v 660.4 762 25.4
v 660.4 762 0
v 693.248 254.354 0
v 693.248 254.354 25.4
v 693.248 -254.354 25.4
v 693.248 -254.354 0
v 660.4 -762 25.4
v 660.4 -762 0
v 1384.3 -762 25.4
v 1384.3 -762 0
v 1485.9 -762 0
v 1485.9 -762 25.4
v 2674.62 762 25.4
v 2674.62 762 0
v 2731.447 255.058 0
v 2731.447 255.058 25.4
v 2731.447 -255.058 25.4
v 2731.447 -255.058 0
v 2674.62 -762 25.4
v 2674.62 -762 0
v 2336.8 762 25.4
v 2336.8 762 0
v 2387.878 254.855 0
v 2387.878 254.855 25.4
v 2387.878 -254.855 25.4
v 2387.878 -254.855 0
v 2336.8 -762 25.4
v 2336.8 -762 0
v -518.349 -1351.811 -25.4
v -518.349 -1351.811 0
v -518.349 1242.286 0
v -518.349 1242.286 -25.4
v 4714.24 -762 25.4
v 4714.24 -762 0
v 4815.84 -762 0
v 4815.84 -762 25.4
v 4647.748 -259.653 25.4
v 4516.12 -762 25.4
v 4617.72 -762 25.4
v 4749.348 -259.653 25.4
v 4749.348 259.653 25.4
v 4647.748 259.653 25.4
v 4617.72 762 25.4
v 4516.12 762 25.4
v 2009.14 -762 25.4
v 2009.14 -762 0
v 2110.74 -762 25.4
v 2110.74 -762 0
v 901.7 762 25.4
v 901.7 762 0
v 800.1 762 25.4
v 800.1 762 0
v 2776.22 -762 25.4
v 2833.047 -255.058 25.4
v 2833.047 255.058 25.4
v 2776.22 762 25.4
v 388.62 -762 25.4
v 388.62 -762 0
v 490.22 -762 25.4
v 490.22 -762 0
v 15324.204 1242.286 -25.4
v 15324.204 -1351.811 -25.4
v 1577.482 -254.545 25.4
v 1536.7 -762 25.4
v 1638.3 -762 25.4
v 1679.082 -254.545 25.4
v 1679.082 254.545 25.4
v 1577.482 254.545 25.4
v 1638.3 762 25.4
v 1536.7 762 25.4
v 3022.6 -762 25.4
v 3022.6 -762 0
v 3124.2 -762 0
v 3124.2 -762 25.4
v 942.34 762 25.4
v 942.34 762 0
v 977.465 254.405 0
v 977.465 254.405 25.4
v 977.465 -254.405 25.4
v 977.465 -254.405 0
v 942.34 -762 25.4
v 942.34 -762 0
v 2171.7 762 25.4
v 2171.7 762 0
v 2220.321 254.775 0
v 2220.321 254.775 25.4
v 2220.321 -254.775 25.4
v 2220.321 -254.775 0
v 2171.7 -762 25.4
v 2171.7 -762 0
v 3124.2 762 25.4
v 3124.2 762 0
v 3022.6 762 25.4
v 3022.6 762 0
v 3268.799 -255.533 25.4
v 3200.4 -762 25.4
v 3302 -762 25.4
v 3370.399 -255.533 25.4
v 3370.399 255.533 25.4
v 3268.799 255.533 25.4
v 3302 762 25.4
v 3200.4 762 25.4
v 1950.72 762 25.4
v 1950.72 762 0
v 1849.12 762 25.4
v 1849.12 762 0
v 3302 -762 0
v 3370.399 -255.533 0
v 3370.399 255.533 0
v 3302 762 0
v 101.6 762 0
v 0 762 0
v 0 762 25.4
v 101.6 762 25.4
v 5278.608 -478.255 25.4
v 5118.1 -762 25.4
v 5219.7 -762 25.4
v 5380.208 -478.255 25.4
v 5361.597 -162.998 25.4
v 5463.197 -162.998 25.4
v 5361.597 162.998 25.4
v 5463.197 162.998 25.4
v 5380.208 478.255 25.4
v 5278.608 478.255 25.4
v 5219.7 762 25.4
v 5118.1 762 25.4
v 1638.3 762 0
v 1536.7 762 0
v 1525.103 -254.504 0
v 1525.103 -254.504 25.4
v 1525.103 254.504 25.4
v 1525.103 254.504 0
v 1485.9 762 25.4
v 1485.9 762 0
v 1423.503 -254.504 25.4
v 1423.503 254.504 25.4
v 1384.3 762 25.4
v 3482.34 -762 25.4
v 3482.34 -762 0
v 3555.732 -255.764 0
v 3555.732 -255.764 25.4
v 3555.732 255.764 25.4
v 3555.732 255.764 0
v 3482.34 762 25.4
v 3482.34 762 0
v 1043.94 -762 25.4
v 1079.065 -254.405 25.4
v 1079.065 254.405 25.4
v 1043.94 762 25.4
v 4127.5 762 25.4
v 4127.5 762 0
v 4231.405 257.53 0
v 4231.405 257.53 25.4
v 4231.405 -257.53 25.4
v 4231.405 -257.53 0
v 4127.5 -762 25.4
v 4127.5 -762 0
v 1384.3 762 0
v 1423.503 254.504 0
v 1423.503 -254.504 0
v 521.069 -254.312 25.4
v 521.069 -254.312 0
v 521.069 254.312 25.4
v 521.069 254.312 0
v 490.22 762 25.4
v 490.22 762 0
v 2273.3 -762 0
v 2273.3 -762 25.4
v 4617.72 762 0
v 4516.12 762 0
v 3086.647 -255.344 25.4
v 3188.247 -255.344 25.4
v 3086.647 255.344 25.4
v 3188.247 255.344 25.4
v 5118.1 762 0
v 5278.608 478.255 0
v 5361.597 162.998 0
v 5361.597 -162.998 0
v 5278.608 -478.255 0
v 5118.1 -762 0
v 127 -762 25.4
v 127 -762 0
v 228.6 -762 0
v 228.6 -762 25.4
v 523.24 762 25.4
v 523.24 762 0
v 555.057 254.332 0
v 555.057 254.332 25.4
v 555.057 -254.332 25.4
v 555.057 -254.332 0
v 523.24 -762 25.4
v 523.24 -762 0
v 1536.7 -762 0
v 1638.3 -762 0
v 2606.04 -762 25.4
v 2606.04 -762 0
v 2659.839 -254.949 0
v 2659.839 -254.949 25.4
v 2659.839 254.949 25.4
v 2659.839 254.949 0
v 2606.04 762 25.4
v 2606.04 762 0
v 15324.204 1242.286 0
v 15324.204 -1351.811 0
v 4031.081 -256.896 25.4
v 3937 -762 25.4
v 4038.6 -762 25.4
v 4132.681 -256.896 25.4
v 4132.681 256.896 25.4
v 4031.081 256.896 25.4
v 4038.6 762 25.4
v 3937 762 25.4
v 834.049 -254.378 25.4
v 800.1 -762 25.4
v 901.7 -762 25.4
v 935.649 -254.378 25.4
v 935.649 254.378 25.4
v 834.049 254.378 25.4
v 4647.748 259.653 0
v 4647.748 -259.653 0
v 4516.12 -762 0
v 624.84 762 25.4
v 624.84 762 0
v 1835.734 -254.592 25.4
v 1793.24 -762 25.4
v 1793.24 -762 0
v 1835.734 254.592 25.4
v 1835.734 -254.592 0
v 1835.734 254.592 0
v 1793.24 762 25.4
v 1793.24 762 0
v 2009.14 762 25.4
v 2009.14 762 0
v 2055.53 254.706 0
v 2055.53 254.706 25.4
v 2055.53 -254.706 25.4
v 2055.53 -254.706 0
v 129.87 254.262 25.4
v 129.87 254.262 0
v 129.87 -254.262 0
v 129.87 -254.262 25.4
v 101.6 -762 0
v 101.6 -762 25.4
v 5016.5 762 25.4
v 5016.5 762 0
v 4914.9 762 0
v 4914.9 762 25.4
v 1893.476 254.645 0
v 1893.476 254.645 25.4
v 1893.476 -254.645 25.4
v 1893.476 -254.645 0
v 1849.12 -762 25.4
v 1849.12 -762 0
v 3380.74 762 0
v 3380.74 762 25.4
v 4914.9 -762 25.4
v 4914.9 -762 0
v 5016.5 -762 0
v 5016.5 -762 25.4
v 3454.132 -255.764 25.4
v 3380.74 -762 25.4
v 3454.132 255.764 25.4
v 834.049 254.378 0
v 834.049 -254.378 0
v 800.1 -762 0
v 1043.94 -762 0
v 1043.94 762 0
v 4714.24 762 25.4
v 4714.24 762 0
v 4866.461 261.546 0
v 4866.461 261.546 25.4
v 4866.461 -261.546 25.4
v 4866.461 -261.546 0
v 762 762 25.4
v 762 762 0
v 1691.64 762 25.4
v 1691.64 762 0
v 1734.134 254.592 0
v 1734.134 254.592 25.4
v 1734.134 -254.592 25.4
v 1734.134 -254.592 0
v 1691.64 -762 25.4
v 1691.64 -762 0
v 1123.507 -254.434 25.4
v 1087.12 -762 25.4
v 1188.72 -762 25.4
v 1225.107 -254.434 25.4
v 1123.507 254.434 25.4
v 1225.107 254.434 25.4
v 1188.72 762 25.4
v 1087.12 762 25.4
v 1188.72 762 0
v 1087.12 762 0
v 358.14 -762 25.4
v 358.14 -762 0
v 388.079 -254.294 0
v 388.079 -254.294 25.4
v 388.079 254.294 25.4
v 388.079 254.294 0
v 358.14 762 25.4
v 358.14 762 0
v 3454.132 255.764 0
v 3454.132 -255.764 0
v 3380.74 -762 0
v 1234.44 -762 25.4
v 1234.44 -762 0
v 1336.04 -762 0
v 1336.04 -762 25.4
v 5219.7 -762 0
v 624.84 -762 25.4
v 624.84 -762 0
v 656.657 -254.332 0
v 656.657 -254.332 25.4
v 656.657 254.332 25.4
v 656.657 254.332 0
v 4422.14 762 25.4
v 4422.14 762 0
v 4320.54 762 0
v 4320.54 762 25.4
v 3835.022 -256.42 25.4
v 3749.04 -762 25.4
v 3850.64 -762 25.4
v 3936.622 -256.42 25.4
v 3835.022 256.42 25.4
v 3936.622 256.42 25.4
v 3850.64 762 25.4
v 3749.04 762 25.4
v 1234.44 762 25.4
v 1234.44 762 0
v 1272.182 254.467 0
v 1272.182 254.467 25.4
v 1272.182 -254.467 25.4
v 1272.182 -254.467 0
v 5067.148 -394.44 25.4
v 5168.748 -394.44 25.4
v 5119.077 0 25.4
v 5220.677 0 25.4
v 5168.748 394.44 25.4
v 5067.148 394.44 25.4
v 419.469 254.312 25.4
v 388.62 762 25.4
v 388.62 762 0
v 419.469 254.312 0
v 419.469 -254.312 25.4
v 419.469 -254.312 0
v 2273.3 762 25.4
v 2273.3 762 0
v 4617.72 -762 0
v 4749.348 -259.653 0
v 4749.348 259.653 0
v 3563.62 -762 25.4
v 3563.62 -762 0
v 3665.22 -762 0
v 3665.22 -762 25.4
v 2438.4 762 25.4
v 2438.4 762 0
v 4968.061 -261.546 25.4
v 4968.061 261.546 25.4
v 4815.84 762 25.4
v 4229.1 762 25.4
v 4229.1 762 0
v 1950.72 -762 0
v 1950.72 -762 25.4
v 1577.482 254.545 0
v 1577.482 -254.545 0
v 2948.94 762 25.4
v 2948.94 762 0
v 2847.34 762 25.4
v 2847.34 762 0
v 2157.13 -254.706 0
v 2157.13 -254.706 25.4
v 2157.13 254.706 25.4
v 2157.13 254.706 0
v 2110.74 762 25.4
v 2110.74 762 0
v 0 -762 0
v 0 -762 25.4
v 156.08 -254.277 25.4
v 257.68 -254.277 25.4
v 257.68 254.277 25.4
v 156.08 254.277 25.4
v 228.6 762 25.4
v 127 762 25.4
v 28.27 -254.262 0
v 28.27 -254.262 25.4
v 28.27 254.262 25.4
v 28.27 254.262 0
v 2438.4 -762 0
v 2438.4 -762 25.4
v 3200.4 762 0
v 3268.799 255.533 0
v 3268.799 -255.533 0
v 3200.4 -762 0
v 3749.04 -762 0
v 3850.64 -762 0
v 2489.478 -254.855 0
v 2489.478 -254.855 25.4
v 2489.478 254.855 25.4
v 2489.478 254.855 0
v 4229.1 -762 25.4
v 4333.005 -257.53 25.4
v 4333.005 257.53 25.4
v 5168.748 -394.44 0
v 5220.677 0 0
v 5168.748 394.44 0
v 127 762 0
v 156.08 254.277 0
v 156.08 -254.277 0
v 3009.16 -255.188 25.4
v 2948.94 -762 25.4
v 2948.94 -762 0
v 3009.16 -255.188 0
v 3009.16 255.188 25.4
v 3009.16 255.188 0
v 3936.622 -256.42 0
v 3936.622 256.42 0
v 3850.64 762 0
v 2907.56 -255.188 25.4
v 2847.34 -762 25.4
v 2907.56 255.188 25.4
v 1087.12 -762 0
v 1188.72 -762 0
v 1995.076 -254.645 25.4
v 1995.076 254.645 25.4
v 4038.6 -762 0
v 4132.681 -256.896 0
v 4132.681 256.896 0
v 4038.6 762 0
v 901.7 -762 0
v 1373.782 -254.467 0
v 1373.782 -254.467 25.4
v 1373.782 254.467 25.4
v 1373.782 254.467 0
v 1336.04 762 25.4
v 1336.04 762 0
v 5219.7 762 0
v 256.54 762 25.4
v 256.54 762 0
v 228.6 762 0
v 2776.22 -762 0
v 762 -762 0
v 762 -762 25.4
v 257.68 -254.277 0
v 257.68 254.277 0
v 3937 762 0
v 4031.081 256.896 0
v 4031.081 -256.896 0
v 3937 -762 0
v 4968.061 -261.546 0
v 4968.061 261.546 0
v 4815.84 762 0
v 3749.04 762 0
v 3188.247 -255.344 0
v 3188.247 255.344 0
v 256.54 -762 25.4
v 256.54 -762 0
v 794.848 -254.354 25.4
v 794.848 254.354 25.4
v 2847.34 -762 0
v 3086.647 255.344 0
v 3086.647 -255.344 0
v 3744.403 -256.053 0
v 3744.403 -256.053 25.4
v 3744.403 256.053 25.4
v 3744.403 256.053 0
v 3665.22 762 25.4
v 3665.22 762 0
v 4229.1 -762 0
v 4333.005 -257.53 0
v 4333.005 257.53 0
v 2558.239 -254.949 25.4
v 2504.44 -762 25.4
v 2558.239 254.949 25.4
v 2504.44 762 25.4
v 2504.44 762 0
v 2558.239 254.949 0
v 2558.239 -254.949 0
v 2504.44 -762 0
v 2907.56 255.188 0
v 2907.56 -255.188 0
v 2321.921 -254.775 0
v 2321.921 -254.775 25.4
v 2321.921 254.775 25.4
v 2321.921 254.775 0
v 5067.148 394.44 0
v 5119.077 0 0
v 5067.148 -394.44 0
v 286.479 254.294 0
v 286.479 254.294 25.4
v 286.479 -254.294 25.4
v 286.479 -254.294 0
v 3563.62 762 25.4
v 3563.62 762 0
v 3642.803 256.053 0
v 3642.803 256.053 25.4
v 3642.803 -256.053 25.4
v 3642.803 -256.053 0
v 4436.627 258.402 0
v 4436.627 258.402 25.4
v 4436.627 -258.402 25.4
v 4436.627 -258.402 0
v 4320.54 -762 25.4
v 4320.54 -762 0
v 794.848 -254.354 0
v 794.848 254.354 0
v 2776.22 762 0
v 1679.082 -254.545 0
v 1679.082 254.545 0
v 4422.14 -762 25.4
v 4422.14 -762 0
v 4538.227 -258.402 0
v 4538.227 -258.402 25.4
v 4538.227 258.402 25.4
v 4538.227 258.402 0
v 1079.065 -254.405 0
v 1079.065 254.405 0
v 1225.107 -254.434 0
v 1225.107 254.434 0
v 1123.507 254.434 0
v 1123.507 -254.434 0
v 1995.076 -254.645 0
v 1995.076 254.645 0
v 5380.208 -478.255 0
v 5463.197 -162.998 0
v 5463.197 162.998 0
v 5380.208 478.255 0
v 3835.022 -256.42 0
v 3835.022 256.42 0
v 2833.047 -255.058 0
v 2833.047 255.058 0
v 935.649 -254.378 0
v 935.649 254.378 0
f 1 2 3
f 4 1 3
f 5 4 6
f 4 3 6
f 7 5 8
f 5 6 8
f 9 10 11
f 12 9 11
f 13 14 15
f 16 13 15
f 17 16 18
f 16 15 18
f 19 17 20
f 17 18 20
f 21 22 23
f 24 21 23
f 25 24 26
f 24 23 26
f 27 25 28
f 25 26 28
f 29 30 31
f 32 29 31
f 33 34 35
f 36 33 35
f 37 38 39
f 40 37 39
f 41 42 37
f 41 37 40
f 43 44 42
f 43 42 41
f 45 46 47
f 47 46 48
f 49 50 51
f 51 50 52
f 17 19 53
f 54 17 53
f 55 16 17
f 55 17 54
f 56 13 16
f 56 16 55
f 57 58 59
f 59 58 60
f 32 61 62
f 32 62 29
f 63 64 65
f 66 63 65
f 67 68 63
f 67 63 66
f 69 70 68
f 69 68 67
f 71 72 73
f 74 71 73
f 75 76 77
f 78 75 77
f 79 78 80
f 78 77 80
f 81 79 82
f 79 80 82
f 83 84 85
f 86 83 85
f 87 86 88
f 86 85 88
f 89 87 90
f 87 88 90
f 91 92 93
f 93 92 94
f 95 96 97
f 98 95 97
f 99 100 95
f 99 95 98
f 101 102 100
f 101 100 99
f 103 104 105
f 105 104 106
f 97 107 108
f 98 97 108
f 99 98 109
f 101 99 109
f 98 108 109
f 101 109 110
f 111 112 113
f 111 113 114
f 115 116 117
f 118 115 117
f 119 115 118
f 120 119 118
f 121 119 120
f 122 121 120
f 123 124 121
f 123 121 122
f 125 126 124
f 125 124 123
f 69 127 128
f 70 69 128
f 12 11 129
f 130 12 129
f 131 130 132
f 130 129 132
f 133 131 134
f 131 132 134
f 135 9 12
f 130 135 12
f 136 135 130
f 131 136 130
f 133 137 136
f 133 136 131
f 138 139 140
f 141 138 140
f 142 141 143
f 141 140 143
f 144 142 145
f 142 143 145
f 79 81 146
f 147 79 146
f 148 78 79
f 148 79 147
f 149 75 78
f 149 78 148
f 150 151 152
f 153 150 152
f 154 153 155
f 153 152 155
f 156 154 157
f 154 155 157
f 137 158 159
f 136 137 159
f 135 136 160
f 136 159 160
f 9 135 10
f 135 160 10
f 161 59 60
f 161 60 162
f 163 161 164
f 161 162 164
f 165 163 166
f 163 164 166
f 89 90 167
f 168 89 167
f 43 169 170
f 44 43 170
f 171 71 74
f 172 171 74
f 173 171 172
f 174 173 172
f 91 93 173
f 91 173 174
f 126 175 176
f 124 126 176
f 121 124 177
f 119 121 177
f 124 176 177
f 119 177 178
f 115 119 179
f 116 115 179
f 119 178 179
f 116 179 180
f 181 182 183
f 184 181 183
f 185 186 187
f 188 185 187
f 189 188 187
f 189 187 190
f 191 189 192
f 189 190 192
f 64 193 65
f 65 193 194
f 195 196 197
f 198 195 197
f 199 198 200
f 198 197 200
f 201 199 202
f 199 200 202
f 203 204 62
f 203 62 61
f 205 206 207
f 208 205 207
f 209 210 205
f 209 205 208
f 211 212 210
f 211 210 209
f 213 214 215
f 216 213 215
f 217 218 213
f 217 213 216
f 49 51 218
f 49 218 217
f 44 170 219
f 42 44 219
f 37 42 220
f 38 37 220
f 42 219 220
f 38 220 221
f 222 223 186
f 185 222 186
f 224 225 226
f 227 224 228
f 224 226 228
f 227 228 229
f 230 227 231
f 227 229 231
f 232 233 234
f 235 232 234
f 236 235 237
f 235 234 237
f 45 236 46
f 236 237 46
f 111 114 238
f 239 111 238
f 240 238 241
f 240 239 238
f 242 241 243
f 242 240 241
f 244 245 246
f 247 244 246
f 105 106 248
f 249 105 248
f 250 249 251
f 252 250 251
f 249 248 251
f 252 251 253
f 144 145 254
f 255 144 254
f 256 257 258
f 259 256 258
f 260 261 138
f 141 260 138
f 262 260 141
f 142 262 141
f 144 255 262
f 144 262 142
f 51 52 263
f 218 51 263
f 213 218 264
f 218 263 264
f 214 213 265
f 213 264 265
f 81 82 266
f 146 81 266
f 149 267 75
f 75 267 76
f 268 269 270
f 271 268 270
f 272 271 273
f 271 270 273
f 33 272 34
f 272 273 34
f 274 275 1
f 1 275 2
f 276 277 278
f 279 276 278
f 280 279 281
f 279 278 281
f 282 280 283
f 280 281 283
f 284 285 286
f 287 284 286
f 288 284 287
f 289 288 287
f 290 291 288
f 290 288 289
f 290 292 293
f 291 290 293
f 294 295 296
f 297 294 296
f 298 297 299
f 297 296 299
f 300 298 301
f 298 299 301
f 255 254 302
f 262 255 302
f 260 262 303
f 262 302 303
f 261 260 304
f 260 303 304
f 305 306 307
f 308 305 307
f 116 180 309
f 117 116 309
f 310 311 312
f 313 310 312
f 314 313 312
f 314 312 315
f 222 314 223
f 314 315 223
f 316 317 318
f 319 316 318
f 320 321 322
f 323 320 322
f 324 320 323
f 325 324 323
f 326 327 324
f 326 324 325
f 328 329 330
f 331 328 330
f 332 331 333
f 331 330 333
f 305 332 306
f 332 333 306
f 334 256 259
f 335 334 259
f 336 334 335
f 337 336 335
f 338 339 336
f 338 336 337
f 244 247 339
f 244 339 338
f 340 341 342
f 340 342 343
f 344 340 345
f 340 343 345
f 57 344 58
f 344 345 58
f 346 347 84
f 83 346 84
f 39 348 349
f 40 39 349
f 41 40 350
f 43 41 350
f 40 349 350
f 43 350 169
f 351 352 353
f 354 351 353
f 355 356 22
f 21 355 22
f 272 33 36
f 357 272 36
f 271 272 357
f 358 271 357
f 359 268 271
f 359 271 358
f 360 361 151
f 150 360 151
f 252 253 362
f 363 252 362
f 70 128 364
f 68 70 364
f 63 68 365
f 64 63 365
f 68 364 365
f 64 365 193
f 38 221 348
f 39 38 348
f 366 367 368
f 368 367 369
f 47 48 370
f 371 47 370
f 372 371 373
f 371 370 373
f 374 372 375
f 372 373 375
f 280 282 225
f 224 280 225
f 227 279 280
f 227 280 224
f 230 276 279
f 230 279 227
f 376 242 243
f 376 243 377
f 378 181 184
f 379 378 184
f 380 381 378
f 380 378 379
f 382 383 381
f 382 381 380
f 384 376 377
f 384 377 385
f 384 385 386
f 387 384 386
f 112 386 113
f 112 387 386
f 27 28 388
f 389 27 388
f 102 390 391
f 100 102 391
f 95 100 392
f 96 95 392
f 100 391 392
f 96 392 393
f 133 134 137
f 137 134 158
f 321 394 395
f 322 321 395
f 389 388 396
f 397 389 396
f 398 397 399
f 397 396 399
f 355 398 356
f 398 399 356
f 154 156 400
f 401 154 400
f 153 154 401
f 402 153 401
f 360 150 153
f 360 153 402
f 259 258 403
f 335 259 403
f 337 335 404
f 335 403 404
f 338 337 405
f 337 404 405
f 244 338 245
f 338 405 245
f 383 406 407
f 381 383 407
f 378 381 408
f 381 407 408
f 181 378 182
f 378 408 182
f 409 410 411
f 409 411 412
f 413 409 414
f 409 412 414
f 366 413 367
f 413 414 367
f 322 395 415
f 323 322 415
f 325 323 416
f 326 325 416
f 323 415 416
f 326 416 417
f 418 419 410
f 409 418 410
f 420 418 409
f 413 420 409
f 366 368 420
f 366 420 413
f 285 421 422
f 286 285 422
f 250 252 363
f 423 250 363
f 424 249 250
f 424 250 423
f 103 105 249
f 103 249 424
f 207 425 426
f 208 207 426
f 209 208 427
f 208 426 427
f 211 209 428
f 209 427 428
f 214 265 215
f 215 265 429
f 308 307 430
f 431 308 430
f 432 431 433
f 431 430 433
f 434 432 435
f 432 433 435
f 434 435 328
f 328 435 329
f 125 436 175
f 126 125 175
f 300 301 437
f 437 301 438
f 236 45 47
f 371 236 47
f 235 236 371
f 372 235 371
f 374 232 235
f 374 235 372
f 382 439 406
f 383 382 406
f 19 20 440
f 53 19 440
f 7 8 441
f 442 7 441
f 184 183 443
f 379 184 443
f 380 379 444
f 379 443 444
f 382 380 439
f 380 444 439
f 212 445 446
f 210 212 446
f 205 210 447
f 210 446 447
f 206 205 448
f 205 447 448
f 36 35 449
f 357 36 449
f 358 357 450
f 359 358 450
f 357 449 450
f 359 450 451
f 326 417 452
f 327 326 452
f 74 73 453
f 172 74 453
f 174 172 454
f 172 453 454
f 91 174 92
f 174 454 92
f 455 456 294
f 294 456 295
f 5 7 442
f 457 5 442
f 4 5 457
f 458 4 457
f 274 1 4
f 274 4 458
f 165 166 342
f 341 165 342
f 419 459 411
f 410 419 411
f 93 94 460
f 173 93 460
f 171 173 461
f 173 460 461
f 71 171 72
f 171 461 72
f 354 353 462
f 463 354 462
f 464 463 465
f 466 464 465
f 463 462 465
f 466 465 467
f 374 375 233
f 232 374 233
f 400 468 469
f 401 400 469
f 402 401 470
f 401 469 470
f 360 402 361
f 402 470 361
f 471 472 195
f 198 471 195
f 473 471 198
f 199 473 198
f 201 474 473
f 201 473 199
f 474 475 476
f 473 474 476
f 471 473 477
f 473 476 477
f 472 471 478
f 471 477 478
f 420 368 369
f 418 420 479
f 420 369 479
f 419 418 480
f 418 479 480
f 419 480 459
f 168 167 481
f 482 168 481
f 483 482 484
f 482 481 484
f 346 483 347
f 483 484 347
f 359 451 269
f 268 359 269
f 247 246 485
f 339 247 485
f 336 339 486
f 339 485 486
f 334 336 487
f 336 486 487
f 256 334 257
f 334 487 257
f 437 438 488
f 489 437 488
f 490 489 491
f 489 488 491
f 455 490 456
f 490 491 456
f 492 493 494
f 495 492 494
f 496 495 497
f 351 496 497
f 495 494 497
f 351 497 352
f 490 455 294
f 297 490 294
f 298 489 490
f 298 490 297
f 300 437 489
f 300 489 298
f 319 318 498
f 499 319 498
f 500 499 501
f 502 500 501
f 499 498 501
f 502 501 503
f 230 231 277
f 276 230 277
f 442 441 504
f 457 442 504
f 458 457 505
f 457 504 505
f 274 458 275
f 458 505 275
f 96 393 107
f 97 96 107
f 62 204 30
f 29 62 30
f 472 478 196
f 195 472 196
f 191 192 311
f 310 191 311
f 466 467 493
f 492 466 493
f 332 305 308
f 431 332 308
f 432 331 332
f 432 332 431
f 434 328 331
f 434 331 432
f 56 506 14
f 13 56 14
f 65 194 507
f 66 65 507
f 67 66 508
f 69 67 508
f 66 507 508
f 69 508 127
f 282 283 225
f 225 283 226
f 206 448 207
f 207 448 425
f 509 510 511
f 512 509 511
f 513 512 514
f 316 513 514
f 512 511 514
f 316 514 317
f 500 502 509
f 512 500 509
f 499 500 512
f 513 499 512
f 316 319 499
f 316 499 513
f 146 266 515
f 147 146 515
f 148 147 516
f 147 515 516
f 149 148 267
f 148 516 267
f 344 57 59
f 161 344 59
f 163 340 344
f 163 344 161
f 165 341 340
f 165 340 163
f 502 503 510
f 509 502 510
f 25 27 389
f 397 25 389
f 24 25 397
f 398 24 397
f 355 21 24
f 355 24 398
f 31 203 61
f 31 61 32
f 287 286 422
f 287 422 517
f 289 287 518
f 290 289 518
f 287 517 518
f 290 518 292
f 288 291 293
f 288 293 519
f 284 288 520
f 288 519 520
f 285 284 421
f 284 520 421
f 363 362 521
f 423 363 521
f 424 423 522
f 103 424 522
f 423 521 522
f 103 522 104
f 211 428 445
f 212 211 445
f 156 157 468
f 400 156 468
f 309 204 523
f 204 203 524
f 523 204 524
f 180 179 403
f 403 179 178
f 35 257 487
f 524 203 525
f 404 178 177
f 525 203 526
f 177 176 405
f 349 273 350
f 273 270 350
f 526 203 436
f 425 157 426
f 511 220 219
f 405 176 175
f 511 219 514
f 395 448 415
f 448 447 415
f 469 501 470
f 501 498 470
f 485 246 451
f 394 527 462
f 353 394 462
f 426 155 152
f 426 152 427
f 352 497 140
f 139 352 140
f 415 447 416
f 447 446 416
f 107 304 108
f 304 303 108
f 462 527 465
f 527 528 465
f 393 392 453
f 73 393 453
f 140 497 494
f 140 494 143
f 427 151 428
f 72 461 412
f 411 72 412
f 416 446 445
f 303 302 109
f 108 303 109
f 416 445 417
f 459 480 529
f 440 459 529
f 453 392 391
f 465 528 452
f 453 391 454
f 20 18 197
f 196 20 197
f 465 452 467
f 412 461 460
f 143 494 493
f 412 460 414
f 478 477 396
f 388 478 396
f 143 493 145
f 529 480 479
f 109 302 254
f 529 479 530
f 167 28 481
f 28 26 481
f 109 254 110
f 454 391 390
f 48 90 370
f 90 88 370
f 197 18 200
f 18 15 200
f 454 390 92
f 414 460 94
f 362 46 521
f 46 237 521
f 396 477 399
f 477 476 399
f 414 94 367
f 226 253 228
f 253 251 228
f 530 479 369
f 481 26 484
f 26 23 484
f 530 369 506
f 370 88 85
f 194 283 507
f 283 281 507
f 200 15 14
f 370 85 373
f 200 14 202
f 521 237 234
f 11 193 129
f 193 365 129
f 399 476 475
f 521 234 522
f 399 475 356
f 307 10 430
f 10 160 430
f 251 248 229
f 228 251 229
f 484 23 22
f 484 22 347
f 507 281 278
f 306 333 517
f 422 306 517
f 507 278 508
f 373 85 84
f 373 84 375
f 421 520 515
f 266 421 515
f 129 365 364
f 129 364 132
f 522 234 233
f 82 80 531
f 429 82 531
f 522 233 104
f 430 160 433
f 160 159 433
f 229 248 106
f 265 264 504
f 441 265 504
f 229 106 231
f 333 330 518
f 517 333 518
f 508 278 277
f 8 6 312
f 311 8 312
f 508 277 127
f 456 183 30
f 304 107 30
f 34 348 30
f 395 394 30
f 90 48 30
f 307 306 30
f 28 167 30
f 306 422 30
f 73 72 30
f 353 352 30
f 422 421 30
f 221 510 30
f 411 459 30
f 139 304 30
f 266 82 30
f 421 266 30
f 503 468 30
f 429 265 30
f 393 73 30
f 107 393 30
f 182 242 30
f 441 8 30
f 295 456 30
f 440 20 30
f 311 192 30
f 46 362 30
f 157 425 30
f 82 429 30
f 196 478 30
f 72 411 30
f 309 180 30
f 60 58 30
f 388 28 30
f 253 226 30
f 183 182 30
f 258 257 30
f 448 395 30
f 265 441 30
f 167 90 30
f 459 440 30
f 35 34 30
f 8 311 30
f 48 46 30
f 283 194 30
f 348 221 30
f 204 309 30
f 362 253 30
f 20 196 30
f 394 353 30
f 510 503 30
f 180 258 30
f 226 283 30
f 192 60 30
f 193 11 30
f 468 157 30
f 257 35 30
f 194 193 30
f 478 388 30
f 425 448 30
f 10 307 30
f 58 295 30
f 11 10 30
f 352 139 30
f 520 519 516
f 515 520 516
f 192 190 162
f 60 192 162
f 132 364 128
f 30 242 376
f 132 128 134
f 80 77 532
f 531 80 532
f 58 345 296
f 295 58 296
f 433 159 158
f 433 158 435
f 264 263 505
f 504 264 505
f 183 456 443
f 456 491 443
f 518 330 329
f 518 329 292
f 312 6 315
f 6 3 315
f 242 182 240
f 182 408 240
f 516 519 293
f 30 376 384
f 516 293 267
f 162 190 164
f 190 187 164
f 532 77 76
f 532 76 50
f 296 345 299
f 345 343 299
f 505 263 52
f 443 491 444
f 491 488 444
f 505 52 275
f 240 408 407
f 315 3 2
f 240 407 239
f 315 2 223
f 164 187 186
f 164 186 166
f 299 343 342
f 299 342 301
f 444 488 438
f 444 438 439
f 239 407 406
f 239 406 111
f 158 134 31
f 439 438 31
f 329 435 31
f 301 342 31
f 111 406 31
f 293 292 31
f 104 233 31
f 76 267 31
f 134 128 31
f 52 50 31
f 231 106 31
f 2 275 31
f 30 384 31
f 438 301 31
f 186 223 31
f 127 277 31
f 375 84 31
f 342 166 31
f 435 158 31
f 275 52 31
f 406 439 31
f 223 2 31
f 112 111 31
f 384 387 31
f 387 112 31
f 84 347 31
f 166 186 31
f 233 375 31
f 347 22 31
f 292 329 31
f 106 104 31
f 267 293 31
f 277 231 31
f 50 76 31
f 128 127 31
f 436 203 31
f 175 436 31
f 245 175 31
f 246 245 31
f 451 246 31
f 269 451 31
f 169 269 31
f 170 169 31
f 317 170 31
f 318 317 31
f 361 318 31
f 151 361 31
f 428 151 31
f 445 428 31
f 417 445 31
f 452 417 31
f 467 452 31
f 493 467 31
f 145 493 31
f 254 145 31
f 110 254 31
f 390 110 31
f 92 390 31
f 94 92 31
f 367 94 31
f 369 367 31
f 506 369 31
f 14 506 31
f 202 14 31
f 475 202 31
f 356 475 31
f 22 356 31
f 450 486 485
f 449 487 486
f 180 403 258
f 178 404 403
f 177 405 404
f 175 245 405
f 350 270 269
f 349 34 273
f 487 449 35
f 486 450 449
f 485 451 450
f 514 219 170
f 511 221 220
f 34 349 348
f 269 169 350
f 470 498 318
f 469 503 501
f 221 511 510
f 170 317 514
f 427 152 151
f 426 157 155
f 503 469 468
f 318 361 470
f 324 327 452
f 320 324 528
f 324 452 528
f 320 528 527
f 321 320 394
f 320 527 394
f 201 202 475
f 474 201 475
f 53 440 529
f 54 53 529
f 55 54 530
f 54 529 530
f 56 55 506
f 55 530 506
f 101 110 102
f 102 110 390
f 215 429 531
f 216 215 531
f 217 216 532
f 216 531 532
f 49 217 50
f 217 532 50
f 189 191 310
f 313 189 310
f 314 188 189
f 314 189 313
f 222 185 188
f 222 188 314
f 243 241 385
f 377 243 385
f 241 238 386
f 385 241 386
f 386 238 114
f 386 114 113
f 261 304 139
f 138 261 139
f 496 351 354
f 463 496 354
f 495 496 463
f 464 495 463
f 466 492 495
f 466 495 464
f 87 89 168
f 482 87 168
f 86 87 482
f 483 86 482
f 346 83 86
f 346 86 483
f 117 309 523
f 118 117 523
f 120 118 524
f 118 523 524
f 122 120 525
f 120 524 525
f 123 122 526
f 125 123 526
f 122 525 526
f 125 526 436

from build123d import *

# Parameters (mm, degrees)
BOSS_EXTRUDE1_DEPTH = 25.4
SKETCH2_W           = 15842.55357726
SKETCH2_H           = 2594.096375424
BOSS_EXTRUDE2_DEPTH = 25.4
LPATTERN1_DEPTH     = 25.4


# Read off the part's stored shape, not the designer's step: LPattern1
with BuildPart() as part:
    # Sketch1 → Boss-Extrude1 (new body)
    with BuildSketch(Plane.XY):
        with BuildLine():
            Line((0, 762), (101.6, 762))
            ThreePointArc((101.6, 762), (133.405313757, 0), (101.6, -762))
            Line((101.6, -762), (0, -762))
            ThreePointArc((0, -762), (31.805313757, 0), (0, 762))
        make_face()
    extrude(amount=BOSS_EXTRUDE1_DEPTH)

    # Sketch2 → Boss-Extrude2 (add)
    with BuildSketch(Plane(origin=(0, 0, 0), x_dir=(-1, 0, 0), z_dir=(0, 0, -1))):
        with Locations((-7402.927555246, -54.762680467)):
            Rectangle(SKETCH2_W, SKETCH2_H)
    extrude(amount=BOSS_EXTRUDE2_DEPTH)

    # LPattern1 outline → LPattern1 (add)
    with BuildSketch(Plane.XY):
        with BuildLine():
            Line((127, -762), (228.6, -762))
            ThreePointArc((228.6, -762), (261.317346725, 0), (228.6, 762))
            Line((228.6, 762), (127, 762))
            ThreePointArc((127, 762), (159.717346725, 0), (127, -762))
        make_face()
        with BuildLine():
            Line((256.54, -762), (358.14, -762))
            ThreePointArc((358.14, -762), (391.823335287, 0), (358.14, 762))
            Line((358.14, 762), (256.54, 762))
            ThreePointArc((256.54, 762), (290.223335287, 0), (256.54, -762))
        make_face()
        with BuildLine():
            Line((388.62, -762), (490.22, -762))
            ThreePointArc((490.22, -762), (524.928223621, 0), (490.22, 762))
            Line((490.22, 762), (388.62, 762))
            ThreePointArc((388.62, 762), (423.328223621, 0), (388.62, -762))
        make_face()
        with BuildLine():
            Line((523.24, -762), (624.84, -762))
            ThreePointArc((624.84, -762), (660.637580386, 0), (624.84, 762))
            Line((624.84, 762), (523.24, 762))
            ThreePointArc((523.24, 762), (559.037580386, 0), (523.24, -762))
        make_face()
        with BuildLine():
            Line((660.4, -762), (762, -762))
            ThreePointArc((762, -762), (798.957700765, 0), (762, 762))
            Line((762, 762), (660.4, 762))
            ThreePointArc((660.4, 762), (697.357700765, 0), (660.4, -762))
        make_face()
        with BuildLine():
            Line((800.1, -762), (901.7, -762))
            ThreePointArc((901.7, -762), (939.895729248, 0), (901.7, 762))
            Line((901.7, 762), (800.1, 762))
            ThreePointArc((800.1, 762), (838.295729248, 0), (800.1, -762))
        make_face()
        with BuildLine():
            Line((942.34, -762), (1043.94, -762))
            ThreePointArc((1043.94, -762), (1083.459808257, 0), (1043.94, 762))
            Line((1043.94, 762), (942.34, 762))
            ThreePointArc((942.34, 762), (981.859808257, 0), (942.34, -762))
        make_face()
        with BuildLine():
            Line((1087.12, -762), (1188.72, -762))
            ThreePointArc((1188.72, -762), (1229.659259206, 0), (1188.72, 762))
            Line((1188.72, 762), (1087.12, 762))
            ThreePointArc((1087.12, 762), (1128.059259206, 0), (1087.12, -762))
        make_face()
        with BuildLine():
            Line((1234.44, -762), (1336.04, -762))
            ThreePointArc((1336.04, -762), (1378.504804581, 0), (1336.04, 762))
            Line((1336.04, 762), (1234.44, 762))
            ThreePointArc((1234.44, 762), (1276.904804581, 0), (1234.44, -762))
        make_face()
        with BuildLine():
            Line((1384.3, -762), (1485.9, -762))
            ThreePointArc((1485.9, -762), (1530.008842366, 0), (1485.9, 762))
            Line((1485.9, 762), (1384.3, 762))
            ThreePointArc((1384.3, 762), (1428.408842366, 0), (1384.3, -762))
        make_face()
        with BuildLine():
            Line((1536.7, -762), (1638.3, -762))
            ThreePointArc((1638.3, -762), (1684.185787837, 0), (1638.3, 762))
            Line((1638.3, 762), (1536.7, 762))
            ThreePointArc((1536.7, 762), (1582.585787837, 0), (1536.7, -762))
        make_face()
        with BuildLine():
            Line((1691.64, -762), (1793.24, -762))
            ThreePointArc((1793.24, -762), (1841.052502906, 0), (1793.24, 762))
            Line((1793.24, 762), (1691.64, 762))
            ThreePointArc((1691.64, 762), (1739.452502906, 0), (1691.64, -762))
        make_face()
        with BuildLine():
            Line((1849.12, -762), (1950.72, -762))
            ThreePointArc((1950.72, -762), (2000.628840496, 0), (1950.72, 762))
            Line((1950.72, 762), (1849.12, 762))
            ThreePointArc((1849.12, 762), (1899.028840496, 0), (1849.12, -762))
        make_face()
        with BuildLine():
            Line((2009.14, -762), (2110.74, -762))
            ThreePointArc((2110.74, -762), (2162.938341703, 0), (2110.74, 762))
            Line((2110.74, 762), (2009.14, 762))
            ThreePointArc((2009.14, 762), (2061.338341703, 0), (2009.14, -762))
        make_face()
        with BuildLine():
            Line((2171.7, -762), (2273.3, -762))
            ThreePointArc((2273.3, -762), (2328.00913853, 0), (2273.3, 762))
            Line((2273.3, 762), (2171.7, 762))
            ThreePointArc((2171.7, 762), (2226.40913853, 0), (2171.7, -762))
        make_face()
        with BuildLine():
            Line((2336.8, -762), (2438.4, -762))
            ThreePointArc((2438.4, -762), (2495.875136946, 0), (2438.4, 762))
            Line((2438.4, 762), (2336.8, 762))
            ThreePointArc((2336.8, 762), (2394.275136946, 0), (2336.8, -762))
        make_face()
        with BuildLine():
            Line((2504.44, -762), (2606.04, -762))
            ThreePointArc((2606.04, -762), (2666.577588019, 0), (2606.04, 762))
            Line((2606.04, 762), (2504.44, 762))
            ThreePointArc((2504.44, 762), (2564.977588019, 0), (2504.44, -762))
        make_face()
        with BuildLine():
            Line((2674.62, -762), (2776.22, -762))
            ThreePointArc((2776.22, -762), (2840.167205278, 0), (2776.22, 762))
            Line((2776.22, 762), (2674.62, 762))
            ThreePointArc((2674.62, 762), (2738.567205278, 0), (2674.62, -762))
        make_face()
        with BuildLine():
            Line((2847.34, -762), (2948.94, -762))
            ThreePointArc((2948.94, -762), (3016.707065207, 0), (2948.94, 762))
            Line((2948.94, 762), (2847.34, 762))
            ThreePointArc((2847.34, 762), (2915.107065207, 0), (2847.34, -762))
        make_face()
        with BuildLine():
            Line((3022.6, -762), (3124.2, -762))
            ThreePointArc((3124.2, -762), (3196.276654043, 0), (3124.2, 762))
            Line((3124.2, 762), (3022.6, 762))
            ThreePointArc((3022.6, 762), (3094.676654043, 0), (3022.6, -762))
        make_face()
        with BuildLine():
            Line((3200.4, -762), (3302, -762))
            ThreePointArc((3302, -762), (3378.977631998, 0), (3302, 762))
            Line((3302, 762), (3200.4, 762))
            ThreePointArc((3200.4, 762), (3277.377631998, 0), (3200.4, -762))
        make_face()
        with BuildLine():
            Line((3380.74, -762), (3482.34, -762))
            ThreePointArc((3482.34, -762), (3564.942239881, 0), (3482.34, 762))
            Line((3482.34, 762), (3380.74, 762))
            ThreePointArc((3380.74, 762), (3463.342239881, 0), (3380.74, -762))
        make_face()
        with BuildLine():
            Line((3563.62, -762), (3665.22, -762))
            ThreePointArc((3665.22, -762), (3754.345897269, 0), (3665.22, 762))
            Line((3665.22, 762), (3563.62, 762))
            ThreePointArc((3563.62, 762), (3652.745897269, 0), (3563.62, -762))
        make_face()
        with BuildLine():
            Line((3749.04, -762), (3850.64, -762))
            ThreePointArc((3850.64, -762), (3947.42669019, 0), (3850.64, 762))
            Line((3850.64, 762), (3749.04, 762))
            ThreePointArc((3749.04, 762), (3845.82669019, 0), (3749.04, -762))
        make_face()
        with BuildLine():
            Line((3937, -762), (4038.6, -762))
            ThreePointArc((4038.6, -762), (4144.516667958, 0), (4038.6, 762))
            Line((4038.6, 762), (3937, 762))
            ThreePointArc((3937, 762), (4042.916667958, 0), (3937, -762))
        make_face()
        with BuildLine():
            Line((4127.5, -762), (4229.1, -762))
            ThreePointArc((4229.1, -762), (4346.094428401, 0), (4229.1, 762))
            Line((4229.1, 762), (4127.5, 762))
            ThreePointArc((4127.5, 762), (4244.494428401, 0), (4127.5, -762))
        make_face()
        with BuildLine():
            Line((4320.54, -762), (4422.14, -762))
            ThreePointArc((4422.14, -762), (4552.878530943, 0), (4422.14, 762))
            Line((4422.14, 762), (4320.54, 762))
            ThreePointArc((4320.54, 762), (4451.278530943, 0), (4320.54, -762))
        make_face()
        with BuildLine():
            Line((4516.12, -762), (4617.72, -762))
            ThreePointArc((4617.72, -762), (4766.005584278, 0), (4617.72, 762))
            Line((4617.72, 762), (4516.12, 762))
            ThreePointArc((4516.12, 762), (4664.405584278, 0), (4516.12, -762))
        make_face()
        with BuildLine():
            Line((4714.24, -762), (4815.84, -762))
            ThreePointArc((4815.84, -762), (4987.402948634, 0), (4815.84, 762))
            Line((4815.84, 762), (4714.24, 762))
            ThreePointArc((4714.24, 762), (4885.802948634, 0), (4714.24, -762))
        make_face()
        with BuildLine():
            Line((4914.9, -762), (5016.5, -762))
            ThreePointArc((5016.5, -762), (5220.677284633, 0), (5016.5, 762))
            Line((5016.5, 762), (4914.9, 762))
            ThreePointArc((4914.9, 762), (5119.077284633, 0), (4914.9, -762))
        make_face()
        with BuildLine():
            Line((5118.1, -762), (5219.7, -762))
            ThreePointArc((5219.7, -762), (5473.7, 0), (5219.7, 762))
            Line((5219.7, 762), (5118.1, 762))
            ThreePointArc((5118.1, 762), (5372.1, 0), (5118.1, -762))
        make_face()
    extrude(amount=LPATTERN1_DEPTH)


solid = part.part
